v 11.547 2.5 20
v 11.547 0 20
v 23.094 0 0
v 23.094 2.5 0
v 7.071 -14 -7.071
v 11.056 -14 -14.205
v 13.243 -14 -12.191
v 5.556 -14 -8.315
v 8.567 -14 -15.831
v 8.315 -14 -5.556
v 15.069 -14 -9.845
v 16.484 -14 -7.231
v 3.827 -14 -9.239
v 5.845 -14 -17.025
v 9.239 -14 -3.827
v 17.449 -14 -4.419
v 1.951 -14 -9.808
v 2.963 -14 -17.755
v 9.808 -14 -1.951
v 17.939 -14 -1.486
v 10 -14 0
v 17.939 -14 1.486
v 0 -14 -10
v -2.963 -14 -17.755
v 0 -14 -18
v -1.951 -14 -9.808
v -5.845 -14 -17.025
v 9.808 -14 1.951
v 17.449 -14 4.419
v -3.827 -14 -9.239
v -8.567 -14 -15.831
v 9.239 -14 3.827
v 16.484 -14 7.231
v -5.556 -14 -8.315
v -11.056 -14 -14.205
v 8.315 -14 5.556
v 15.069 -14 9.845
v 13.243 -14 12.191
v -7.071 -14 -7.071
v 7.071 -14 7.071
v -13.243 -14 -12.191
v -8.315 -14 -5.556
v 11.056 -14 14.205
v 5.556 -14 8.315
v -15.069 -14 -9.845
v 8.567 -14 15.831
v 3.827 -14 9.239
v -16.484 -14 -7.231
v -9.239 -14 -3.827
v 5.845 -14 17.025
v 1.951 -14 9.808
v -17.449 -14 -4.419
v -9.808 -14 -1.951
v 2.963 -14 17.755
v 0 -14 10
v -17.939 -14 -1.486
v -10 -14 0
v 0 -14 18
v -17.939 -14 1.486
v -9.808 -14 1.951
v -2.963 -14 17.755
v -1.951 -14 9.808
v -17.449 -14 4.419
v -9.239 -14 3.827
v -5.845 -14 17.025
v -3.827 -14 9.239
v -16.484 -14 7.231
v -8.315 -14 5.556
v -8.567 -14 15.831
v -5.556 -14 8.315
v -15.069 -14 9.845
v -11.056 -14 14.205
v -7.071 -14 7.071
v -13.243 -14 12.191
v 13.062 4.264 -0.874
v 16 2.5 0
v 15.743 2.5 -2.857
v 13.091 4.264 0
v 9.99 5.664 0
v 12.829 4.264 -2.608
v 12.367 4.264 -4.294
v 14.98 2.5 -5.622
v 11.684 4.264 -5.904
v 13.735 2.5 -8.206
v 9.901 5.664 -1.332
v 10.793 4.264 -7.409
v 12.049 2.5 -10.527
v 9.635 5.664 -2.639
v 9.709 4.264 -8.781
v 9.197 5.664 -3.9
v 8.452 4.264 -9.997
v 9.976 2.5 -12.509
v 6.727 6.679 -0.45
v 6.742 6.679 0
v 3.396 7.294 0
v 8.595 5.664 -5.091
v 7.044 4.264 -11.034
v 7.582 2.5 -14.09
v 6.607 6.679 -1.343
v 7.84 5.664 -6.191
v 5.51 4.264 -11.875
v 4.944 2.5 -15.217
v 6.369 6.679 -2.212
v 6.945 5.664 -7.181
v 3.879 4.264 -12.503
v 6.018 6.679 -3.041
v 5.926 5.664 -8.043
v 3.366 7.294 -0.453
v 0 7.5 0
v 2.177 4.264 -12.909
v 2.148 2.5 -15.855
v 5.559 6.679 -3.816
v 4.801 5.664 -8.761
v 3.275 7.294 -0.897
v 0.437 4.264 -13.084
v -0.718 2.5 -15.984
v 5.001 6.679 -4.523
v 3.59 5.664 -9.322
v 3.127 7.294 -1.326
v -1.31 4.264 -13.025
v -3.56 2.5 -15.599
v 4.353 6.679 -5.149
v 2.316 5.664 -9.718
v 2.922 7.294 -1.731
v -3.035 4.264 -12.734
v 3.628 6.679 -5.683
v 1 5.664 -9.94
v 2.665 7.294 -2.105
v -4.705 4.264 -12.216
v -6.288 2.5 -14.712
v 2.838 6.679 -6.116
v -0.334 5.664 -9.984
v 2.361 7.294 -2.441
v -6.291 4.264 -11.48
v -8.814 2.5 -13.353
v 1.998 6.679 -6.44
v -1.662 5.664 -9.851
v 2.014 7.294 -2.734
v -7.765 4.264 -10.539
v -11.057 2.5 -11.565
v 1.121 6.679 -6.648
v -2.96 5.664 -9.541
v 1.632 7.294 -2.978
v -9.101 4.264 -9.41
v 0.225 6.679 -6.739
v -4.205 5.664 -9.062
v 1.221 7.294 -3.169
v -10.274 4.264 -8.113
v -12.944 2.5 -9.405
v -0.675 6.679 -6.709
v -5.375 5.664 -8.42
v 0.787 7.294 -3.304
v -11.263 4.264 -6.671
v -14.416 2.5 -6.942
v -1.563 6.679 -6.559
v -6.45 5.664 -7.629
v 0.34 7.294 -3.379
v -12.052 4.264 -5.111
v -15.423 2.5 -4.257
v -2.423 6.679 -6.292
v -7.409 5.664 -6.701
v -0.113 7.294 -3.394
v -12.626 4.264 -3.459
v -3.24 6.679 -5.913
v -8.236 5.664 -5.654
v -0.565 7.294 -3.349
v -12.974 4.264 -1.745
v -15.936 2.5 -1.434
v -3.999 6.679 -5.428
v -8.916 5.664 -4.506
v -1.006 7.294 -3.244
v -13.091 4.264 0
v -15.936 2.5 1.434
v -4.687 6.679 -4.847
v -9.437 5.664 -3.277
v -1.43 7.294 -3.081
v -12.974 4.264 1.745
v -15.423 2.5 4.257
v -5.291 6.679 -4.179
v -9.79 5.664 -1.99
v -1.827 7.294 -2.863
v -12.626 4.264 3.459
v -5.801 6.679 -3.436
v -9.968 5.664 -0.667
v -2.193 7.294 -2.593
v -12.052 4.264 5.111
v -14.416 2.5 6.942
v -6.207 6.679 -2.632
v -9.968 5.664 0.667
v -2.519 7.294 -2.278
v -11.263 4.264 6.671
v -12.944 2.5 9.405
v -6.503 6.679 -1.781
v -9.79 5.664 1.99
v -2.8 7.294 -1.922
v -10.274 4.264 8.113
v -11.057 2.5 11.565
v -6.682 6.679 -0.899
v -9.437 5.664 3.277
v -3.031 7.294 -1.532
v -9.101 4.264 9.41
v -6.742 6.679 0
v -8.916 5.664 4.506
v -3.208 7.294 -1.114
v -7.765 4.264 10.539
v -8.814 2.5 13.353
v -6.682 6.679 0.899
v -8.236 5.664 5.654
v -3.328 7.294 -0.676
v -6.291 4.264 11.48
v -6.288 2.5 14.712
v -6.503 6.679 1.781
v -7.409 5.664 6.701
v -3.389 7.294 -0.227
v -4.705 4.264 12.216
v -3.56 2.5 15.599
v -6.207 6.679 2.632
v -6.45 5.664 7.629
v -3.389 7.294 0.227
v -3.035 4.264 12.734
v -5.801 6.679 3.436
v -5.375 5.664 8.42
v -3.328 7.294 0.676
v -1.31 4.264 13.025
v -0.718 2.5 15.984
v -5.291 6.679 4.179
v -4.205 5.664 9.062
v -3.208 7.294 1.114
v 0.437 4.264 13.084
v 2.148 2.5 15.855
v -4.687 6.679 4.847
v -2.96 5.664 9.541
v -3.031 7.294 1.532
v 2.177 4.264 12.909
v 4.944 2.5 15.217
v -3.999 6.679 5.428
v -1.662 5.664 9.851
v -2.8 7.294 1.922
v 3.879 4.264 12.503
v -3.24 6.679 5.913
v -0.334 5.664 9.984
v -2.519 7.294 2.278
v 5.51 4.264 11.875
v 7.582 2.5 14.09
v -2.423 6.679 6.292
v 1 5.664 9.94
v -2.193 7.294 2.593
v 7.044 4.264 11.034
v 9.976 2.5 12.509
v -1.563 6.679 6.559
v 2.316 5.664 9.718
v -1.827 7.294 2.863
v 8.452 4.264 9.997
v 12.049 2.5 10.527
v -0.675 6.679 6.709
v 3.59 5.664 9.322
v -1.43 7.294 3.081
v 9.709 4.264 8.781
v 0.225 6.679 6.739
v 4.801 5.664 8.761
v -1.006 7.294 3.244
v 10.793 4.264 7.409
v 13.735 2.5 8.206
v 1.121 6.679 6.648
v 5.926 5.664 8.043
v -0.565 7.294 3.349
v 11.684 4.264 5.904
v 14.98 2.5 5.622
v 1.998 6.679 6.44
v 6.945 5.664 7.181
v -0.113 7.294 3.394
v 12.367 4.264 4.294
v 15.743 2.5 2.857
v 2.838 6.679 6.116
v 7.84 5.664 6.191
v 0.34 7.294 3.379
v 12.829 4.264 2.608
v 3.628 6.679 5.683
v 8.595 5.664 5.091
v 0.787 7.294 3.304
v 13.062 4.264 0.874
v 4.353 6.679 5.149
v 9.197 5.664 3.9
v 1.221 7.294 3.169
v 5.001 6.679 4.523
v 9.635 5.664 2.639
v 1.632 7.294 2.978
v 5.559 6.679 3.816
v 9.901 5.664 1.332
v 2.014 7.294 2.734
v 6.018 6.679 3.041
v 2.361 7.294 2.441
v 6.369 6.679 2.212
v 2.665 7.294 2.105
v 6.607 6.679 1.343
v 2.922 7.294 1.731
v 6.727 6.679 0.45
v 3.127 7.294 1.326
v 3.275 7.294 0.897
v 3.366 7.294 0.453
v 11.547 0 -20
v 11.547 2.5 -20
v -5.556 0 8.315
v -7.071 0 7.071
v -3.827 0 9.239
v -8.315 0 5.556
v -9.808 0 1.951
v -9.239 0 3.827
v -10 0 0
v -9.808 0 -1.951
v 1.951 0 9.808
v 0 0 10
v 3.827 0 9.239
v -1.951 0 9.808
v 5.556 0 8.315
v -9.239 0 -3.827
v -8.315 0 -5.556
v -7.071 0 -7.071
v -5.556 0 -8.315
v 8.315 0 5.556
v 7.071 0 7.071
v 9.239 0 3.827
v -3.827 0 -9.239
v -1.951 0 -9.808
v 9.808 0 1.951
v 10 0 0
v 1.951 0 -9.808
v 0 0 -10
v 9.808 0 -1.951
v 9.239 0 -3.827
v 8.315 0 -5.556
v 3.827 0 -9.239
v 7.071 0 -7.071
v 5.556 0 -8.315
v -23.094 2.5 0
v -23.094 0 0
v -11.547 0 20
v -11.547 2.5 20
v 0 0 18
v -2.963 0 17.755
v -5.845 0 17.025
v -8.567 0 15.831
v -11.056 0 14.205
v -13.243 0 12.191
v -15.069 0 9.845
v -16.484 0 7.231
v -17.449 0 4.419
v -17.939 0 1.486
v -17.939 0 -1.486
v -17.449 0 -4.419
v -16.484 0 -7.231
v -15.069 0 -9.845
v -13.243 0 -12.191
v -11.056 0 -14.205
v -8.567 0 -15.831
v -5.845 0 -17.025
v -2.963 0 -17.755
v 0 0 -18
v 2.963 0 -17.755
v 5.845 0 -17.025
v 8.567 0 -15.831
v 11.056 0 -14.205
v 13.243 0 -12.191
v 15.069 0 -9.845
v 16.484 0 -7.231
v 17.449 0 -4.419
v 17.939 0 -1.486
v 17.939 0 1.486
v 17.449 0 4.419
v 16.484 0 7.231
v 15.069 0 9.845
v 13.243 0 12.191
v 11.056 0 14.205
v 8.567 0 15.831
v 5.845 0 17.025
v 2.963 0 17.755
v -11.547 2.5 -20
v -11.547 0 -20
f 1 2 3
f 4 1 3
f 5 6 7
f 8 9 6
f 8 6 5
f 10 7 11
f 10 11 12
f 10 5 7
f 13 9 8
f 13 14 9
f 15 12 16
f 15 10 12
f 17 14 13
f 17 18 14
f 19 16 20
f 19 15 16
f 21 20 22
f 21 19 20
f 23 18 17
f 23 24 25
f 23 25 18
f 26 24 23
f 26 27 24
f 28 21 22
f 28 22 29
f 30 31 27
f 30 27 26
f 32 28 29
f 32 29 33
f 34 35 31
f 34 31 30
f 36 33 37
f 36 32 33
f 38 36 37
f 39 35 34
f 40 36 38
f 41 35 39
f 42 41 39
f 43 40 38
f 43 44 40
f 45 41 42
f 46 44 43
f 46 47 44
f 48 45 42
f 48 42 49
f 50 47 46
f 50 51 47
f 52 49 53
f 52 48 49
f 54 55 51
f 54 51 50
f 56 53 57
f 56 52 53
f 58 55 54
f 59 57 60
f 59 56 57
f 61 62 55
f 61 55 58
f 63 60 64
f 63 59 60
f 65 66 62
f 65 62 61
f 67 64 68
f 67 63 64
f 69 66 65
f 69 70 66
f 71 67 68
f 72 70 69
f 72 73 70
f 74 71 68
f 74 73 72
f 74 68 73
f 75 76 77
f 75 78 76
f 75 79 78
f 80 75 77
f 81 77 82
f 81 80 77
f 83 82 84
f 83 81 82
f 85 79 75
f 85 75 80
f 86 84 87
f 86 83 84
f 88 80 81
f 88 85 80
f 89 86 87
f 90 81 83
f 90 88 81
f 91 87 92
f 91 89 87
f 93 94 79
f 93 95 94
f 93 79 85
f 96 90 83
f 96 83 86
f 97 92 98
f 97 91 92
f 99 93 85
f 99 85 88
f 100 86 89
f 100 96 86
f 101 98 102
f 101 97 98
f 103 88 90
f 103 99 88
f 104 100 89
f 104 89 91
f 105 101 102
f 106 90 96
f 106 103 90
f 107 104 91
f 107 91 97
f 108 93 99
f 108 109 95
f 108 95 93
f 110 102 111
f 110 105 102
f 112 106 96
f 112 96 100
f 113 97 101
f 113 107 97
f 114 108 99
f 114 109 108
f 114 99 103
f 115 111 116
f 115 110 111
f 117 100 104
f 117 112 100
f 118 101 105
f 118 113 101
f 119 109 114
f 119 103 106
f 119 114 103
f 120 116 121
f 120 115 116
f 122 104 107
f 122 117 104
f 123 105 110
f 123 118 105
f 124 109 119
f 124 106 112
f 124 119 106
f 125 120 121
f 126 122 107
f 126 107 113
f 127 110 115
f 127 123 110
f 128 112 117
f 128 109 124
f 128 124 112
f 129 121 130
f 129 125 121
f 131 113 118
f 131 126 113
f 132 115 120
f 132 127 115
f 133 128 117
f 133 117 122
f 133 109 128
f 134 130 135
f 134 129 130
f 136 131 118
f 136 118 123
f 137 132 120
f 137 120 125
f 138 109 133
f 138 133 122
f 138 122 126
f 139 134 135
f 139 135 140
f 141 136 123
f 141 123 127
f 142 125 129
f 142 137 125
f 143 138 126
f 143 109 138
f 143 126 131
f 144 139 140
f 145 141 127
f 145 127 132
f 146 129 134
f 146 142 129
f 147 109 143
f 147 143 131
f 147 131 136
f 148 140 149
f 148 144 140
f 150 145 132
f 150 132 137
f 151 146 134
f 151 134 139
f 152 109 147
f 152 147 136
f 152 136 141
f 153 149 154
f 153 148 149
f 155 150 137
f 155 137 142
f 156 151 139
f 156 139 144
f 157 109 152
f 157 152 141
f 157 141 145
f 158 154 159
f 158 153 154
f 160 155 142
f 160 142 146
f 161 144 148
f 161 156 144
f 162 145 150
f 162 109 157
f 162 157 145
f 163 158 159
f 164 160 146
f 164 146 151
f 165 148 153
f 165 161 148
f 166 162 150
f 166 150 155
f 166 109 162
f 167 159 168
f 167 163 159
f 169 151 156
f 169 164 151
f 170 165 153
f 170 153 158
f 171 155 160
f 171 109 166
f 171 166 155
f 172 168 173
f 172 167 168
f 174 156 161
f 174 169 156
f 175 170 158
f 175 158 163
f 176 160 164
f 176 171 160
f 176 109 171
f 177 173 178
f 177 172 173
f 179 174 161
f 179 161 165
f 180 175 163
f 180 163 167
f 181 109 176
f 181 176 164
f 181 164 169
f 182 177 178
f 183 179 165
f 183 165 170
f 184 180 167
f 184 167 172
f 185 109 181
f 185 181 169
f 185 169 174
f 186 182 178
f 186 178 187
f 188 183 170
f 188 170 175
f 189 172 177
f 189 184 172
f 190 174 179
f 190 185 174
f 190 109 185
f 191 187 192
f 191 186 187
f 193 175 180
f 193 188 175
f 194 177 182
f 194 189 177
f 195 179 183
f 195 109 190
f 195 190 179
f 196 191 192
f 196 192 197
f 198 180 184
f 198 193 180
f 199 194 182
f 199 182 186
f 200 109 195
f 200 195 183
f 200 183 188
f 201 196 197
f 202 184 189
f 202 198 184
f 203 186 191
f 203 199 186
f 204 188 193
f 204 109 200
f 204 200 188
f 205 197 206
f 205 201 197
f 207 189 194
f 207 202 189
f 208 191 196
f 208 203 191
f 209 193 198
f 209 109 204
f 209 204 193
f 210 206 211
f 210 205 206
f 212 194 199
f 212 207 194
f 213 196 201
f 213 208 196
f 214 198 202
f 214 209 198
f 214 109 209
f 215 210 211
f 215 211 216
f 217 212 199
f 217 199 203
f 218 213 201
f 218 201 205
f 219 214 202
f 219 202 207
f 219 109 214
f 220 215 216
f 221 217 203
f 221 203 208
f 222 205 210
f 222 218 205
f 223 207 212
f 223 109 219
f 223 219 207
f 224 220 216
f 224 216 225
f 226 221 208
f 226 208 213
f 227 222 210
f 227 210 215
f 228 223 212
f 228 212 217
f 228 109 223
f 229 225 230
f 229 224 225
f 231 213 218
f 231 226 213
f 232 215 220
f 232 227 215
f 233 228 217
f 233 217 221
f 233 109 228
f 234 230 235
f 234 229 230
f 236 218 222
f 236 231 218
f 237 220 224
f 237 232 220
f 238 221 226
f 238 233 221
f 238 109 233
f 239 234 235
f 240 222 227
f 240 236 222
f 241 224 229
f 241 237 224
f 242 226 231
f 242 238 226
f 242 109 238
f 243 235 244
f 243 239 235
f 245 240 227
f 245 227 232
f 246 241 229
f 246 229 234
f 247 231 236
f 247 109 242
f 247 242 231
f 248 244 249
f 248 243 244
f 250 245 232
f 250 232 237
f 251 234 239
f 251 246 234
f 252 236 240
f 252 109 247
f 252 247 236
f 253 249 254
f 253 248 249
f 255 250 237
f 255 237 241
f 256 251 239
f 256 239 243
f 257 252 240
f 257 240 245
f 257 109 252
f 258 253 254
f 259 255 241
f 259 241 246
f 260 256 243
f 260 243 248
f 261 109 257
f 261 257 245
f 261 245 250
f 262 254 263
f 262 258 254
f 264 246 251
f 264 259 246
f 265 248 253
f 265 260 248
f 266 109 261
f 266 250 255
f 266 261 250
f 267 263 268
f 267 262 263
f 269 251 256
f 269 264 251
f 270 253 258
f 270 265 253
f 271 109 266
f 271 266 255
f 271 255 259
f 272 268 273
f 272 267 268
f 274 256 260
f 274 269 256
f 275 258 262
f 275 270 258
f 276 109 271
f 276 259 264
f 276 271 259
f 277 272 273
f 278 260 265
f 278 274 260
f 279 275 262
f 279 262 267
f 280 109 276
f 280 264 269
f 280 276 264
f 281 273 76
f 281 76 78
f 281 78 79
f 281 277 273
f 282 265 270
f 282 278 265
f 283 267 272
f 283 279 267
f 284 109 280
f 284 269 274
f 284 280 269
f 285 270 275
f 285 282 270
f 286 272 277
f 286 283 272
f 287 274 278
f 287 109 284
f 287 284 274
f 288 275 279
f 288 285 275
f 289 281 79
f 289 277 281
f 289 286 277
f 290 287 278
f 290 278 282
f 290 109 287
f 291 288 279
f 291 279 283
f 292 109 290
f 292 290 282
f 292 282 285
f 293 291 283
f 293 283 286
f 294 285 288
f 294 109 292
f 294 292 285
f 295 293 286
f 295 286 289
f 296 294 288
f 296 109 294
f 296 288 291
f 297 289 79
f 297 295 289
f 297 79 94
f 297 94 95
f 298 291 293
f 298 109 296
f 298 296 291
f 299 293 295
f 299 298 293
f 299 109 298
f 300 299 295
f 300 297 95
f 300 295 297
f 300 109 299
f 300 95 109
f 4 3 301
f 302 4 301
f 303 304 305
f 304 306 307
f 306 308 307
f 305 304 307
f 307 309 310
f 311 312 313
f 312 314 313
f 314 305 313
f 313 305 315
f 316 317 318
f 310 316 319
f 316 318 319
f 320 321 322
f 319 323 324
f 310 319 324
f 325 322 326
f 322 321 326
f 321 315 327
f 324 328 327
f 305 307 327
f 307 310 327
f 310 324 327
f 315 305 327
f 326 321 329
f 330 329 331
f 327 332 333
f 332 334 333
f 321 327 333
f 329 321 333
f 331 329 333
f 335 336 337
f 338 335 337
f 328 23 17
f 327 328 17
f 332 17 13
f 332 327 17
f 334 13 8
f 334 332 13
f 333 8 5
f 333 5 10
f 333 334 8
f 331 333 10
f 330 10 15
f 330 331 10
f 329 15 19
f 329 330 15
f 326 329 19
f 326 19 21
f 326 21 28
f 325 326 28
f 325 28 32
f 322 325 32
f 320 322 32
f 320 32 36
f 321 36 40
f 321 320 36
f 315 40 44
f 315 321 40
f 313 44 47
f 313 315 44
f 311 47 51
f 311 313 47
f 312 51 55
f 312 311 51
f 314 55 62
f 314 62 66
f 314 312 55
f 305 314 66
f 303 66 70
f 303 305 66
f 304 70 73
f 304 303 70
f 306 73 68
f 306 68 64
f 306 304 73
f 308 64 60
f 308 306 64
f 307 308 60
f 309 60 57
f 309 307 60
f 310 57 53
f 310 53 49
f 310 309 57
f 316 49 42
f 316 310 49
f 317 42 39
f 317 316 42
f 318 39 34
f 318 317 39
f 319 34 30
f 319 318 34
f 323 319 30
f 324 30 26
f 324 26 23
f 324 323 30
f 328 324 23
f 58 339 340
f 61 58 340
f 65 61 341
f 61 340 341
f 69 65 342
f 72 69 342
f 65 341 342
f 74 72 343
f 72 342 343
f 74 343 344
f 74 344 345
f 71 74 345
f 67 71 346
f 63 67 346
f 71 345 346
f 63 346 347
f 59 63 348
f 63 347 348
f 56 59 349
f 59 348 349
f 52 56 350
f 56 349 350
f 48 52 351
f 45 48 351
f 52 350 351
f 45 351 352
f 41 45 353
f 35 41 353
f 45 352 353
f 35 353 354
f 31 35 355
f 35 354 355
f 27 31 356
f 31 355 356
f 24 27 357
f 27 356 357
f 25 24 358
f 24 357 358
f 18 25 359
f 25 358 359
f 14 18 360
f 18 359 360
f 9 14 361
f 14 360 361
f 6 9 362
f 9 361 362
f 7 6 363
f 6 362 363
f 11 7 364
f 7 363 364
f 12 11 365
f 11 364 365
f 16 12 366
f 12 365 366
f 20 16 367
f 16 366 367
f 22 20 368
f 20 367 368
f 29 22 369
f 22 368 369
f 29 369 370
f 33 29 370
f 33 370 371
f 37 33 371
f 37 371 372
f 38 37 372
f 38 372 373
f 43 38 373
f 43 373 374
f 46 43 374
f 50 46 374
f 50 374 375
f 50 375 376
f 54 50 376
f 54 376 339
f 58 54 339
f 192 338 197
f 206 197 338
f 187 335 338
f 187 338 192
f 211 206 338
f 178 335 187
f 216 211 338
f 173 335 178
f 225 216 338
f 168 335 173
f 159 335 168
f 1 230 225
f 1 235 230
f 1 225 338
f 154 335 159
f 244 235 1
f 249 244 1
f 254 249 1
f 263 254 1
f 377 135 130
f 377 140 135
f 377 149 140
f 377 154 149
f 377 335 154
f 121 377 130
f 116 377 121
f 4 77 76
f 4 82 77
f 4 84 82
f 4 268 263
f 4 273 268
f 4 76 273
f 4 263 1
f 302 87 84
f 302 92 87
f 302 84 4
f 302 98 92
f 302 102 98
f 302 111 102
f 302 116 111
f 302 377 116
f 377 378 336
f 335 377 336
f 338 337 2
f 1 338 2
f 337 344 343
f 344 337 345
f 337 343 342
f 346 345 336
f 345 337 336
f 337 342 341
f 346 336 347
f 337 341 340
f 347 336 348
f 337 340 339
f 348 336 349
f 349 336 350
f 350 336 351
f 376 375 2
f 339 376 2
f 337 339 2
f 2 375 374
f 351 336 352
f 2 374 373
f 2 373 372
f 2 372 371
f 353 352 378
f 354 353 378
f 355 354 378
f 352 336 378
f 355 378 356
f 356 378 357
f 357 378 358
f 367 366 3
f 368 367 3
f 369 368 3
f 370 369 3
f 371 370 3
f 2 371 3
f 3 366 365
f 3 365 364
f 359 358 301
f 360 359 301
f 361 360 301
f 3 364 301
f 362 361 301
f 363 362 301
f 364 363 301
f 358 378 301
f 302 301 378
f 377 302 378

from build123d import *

# Parameters (mm, degrees)
BOSS_EXTRUDE1_DEPTH = 2.5
SKETCH3_R           = 18
SKETCH3_R_2         = 10
BOSS_EXTRUDE2_DEPTH = 14


# Read off the part's stored shape, not the designer's step: Dome1
with BuildPart() as part:
    # Sketch1 → Boss-Extrude1 (new body)
    with BuildSketch(Plane(origin=(0, 0, 0), x_dir=(1, 0, 0), z_dir=(0, 1, 0))):
        Polygon((23.094010768, 0), (11.547005384, 20), (-11.547005384, 20), (-23.094010768, 0), (-11.547005384, -20), (11.547005384, -20), align=None)
    extrude(amount=BOSS_EXTRUDE1_DEPTH)

    # Sketch3 → Boss-Extrude2 (add)
    with BuildSketch(Plane.XZ):
        with Locations(Location((0, 0, 0), (0, 0, 90))):
            Circle(SKETCH3_R)
        with Locations(Location((0, 0, 0), (0, 0, 270))):
            Circle(SKETCH3_R_2, mode=Mode.SUBTRACT)
    extrude(amount=BOSS_EXTRUDE2_DEPTH)

    # Dome1 outline → Dome1 (revolve)
    with BuildSketch(Plane.XY):
        with BuildLine():
            Line((0, 2.499999984), (16.000000023, 2.499999984))
            ThreePointArc((16.000000023, 2.499999984), (8.381527321, 6.220887379), (0, 7.5))
            Line((0, 7.5), (0, 2.499999984))
        make_face()
    revolve(axis=Axis((0, 0, 0), (0, 1, 0)))


solid = part.part
